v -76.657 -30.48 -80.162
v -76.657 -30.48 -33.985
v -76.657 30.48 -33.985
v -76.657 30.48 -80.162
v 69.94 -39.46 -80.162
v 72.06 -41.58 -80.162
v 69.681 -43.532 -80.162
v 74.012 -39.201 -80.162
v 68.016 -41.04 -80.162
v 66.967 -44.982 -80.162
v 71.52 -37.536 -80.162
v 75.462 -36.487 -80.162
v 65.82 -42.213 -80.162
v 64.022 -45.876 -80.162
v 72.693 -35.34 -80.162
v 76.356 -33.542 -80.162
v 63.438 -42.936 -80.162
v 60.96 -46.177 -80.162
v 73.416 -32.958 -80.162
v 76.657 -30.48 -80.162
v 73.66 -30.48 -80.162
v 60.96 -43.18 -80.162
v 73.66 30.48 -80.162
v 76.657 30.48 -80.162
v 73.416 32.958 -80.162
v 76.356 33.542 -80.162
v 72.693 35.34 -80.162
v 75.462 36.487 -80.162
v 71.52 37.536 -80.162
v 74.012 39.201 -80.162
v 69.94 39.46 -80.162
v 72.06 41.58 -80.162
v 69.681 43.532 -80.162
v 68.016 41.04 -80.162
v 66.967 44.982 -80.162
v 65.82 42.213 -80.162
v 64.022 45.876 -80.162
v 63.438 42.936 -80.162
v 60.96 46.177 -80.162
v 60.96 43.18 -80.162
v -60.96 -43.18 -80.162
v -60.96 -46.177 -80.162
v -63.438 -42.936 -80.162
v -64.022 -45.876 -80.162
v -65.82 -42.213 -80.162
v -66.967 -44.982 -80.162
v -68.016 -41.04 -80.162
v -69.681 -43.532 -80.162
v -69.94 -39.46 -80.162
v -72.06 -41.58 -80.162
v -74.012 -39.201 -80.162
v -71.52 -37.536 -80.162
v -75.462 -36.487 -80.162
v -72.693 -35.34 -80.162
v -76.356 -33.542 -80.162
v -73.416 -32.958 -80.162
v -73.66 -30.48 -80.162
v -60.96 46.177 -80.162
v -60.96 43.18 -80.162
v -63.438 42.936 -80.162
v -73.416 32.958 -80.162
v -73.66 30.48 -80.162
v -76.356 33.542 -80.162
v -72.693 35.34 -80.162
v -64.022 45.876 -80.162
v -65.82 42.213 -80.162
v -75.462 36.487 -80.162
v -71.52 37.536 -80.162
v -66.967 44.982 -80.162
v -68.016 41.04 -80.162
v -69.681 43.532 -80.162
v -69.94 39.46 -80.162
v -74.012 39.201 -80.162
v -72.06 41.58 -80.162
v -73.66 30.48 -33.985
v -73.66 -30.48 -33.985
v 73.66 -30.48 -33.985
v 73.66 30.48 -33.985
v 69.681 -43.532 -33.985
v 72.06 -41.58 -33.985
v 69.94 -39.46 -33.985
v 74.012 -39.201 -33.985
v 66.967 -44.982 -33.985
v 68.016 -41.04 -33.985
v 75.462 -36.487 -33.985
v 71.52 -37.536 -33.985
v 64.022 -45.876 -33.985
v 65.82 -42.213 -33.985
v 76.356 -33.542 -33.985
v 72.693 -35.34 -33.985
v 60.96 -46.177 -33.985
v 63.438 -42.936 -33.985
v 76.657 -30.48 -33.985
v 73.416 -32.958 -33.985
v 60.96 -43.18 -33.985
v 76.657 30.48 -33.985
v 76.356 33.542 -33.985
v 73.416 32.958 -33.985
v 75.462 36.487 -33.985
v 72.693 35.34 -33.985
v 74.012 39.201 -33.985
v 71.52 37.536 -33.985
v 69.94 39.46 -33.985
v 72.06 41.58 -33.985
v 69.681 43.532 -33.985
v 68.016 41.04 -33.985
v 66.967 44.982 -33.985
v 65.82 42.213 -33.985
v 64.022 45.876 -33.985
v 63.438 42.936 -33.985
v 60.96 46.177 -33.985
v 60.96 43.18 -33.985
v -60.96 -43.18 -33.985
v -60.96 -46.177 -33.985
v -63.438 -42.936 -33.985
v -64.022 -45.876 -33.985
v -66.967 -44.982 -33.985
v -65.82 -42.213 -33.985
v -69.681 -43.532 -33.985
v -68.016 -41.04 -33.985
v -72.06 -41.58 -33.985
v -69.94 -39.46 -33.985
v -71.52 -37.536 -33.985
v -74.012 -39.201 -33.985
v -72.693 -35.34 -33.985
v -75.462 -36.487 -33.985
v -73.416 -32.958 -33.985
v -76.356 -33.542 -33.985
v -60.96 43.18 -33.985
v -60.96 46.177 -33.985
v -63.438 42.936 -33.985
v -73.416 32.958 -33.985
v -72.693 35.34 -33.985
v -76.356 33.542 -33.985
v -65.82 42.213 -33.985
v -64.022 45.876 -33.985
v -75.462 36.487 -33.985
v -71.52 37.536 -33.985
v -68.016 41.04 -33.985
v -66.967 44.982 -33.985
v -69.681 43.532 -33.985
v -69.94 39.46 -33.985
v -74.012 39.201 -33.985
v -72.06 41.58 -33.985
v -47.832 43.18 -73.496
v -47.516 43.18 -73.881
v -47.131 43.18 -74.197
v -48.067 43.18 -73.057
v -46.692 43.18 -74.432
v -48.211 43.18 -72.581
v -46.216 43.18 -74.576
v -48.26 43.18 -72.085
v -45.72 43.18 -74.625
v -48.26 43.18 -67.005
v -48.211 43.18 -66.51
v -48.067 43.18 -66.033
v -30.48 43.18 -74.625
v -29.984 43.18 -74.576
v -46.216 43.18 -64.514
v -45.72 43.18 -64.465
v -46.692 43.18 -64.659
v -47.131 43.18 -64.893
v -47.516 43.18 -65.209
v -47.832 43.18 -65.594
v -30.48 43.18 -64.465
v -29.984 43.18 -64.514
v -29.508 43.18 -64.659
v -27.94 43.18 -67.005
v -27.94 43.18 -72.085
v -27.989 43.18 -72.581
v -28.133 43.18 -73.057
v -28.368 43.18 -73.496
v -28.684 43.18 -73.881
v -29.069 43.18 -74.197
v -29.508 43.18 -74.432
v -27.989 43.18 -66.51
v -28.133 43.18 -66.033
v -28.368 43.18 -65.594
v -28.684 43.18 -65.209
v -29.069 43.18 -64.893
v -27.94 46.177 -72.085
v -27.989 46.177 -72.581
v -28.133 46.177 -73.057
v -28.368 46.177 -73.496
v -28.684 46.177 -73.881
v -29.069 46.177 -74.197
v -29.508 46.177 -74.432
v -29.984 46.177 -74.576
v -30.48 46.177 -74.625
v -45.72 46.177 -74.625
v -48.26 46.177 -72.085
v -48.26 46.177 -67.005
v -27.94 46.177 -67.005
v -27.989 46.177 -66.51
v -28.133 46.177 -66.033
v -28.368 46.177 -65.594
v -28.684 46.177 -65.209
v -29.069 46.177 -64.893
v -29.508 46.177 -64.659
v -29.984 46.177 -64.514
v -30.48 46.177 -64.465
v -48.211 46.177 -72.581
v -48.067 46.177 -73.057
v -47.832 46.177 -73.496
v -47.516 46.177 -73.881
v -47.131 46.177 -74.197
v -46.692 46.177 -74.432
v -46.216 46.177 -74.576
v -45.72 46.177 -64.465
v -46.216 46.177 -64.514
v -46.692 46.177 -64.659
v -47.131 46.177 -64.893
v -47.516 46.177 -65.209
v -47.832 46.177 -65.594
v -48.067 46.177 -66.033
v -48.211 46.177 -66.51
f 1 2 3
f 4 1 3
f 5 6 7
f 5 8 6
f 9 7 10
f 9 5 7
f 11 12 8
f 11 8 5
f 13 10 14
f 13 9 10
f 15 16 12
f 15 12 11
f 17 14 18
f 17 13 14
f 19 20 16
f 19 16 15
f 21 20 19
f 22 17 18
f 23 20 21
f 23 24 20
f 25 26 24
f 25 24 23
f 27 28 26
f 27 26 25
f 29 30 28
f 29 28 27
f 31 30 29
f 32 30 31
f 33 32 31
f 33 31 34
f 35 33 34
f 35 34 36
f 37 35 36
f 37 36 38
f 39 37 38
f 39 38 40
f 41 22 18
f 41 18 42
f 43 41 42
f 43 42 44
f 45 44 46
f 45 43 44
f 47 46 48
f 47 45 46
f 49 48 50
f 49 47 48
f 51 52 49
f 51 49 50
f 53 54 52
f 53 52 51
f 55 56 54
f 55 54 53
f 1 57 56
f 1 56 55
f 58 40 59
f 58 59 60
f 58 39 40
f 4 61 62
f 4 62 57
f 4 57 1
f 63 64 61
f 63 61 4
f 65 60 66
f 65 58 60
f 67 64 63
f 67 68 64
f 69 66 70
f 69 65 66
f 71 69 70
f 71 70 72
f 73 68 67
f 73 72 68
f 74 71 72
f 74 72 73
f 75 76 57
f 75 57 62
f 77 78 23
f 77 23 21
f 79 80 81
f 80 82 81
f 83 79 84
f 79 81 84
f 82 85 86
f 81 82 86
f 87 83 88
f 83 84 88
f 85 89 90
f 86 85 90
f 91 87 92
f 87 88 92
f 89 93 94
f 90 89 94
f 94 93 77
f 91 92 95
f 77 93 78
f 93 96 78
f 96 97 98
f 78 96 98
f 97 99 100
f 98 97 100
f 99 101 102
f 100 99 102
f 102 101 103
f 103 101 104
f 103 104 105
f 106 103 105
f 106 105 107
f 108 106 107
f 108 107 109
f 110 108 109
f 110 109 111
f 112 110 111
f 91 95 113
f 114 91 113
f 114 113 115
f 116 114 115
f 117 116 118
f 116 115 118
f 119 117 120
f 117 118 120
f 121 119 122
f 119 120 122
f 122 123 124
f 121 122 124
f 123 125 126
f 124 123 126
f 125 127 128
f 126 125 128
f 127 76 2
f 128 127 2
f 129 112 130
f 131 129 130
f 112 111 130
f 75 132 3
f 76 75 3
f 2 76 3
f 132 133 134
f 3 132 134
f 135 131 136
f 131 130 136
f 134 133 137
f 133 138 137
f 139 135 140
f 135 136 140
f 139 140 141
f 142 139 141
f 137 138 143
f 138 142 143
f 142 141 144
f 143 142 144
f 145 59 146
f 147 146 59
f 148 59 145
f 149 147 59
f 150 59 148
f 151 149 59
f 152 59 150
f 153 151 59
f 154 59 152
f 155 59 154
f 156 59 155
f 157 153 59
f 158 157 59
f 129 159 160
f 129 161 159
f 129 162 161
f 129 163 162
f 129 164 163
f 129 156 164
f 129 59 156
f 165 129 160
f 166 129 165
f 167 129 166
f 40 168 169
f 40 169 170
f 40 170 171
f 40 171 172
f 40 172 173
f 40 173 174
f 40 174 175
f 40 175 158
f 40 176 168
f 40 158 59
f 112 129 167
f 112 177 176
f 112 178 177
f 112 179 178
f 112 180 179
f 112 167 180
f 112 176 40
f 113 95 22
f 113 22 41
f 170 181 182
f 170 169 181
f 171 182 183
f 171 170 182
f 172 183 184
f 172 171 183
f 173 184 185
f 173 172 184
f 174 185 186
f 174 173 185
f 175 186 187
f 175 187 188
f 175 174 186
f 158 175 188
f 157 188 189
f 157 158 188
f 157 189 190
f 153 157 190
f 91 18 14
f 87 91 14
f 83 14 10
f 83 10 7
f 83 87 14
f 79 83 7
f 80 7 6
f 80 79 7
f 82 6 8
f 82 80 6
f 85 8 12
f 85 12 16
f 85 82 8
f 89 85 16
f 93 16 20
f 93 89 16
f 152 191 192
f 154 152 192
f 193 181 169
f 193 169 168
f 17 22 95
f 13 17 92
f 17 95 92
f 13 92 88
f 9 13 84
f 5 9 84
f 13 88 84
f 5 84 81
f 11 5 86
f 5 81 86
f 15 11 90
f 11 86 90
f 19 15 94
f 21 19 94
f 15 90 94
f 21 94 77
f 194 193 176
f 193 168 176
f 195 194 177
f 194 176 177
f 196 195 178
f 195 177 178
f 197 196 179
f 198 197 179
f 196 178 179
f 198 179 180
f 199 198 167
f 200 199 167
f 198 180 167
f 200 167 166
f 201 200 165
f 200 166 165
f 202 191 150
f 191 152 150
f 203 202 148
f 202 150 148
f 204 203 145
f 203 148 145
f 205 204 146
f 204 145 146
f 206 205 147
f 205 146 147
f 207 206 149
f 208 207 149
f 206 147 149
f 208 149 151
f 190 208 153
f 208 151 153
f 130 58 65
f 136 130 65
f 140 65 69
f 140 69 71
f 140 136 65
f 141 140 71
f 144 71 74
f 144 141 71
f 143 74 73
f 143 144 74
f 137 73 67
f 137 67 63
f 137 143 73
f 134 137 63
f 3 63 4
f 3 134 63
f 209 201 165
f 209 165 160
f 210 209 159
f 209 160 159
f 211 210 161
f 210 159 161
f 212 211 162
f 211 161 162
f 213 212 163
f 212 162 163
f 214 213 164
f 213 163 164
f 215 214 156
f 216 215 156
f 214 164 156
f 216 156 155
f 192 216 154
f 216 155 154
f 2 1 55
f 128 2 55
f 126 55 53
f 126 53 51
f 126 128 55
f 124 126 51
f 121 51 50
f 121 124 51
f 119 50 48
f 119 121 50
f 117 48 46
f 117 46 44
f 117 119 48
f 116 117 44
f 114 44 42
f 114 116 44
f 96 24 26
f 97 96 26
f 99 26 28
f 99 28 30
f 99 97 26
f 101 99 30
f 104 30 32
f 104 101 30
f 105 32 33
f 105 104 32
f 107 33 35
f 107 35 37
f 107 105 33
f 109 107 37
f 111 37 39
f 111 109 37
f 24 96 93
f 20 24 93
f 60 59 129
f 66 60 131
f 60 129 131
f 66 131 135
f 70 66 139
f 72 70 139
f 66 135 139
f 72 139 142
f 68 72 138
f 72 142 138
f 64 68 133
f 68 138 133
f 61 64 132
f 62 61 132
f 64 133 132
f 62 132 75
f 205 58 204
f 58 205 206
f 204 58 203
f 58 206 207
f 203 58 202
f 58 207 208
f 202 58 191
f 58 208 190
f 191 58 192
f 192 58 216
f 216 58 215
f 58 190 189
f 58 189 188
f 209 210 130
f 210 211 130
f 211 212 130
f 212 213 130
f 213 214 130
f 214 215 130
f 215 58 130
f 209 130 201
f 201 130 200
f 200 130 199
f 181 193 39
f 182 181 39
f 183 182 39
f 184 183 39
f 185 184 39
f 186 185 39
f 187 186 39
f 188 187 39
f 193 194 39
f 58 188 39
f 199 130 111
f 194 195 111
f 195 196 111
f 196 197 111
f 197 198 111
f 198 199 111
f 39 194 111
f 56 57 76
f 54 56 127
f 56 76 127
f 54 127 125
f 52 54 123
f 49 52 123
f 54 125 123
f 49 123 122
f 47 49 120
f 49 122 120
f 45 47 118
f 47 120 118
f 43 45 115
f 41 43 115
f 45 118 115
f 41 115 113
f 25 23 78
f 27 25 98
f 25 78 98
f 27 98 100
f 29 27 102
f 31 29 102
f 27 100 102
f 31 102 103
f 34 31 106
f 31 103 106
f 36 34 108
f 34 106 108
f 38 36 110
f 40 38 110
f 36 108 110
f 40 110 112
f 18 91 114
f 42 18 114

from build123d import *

# Parameters (mm, degrees)
PAD016_DEPTH    = 46.1772
SKETCH026_W     = 20.32
SKETCH026_H     = 10.16
POCKET004_DEPTH = 2.9972
FILLET_R        = 2.54


with BuildPart() as part:
    # Sketch019 → Pad016 (new body)
    with BuildSketch(Plane.XY.offset(-33.9852)):
        with BuildLine():
            Line((-60.96, 46.1772), (60.96, 46.1772))
            ThreePointArc((76.6572, 30.48), (72.059597, 41.579597), (60.96, 46.1772))
            Line((76.6572, 30.48), (76.6572, -30.48))
            ThreePointArc((60.96, -46.1772), (72.059597, -41.579597), (76.6572, -30.48))
            Line((60.96, -46.1772), (-60.96, -46.1772))
            ThreePointArc((-76.6572, -30.48), (-72.059597, -41.579597), (-60.96, -46.1772))
            Line((-76.6572, -30.48), (-76.6572, 30.48))
            ThreePointArc((-60.96, 46.1772), (-72.059597, 41.579597), (-76.6572, 30.48))
        make_face()
        with BuildLine():
            Line((-60.96, 43.18), (60.96, 43.18))
            ThreePointArc((73.66, 30.48), (69.940256, 39.460256), (60.96, 43.18))
            Line((73.66, 30.48), (73.66, -30.48))
            ThreePointArc((60.96, -43.18), (69.940256, -39.460256), (73.66, -30.48))
            Line((60.96, -43.18), (-60.96, -43.18))
            ThreePointArc((-73.66, -30.48), (-69.940256, -39.460256), (-60.96, -43.18))
            Line((-73.66, -30.48), (-73.66, 30.48))
            ThreePointArc((-60.96, 43.18), (-69.940256, 39.460256), (-73.66, 30.48))
        make_face(mode=Mode.SUBTRACT)
    extrude(amount=-PAD016_DEPTH)

    # Sketch026 → Pocket004 (cut)
    with BuildSketch(Plane(origin=(0, 46.1772, -33.9852), x_dir=(-1, 0, 0), z_dir=(0, 1, 0))):
        with Locations((38.1, -35.56)):
            Rectangle(SKETCH026_W, SKETCH026_H)
    extrude(amount=-POCKET004_DEPTH, mode=Mode.SUBTRACT)

    # Fillet
    fillet_edges = [part.edges().sort_by_distance(p)[0] for p in [
        (-27.94, 44.6786, -64.4652),
        (-27.94, 44.6786, -74.6252),
        (-48.26, 44.6786, -74.6252),
        (-48.26, 44.6786, -64.4652),
    ]]
    fillet(fillet_edges, radius=FILLET_R)


solid = part.part
